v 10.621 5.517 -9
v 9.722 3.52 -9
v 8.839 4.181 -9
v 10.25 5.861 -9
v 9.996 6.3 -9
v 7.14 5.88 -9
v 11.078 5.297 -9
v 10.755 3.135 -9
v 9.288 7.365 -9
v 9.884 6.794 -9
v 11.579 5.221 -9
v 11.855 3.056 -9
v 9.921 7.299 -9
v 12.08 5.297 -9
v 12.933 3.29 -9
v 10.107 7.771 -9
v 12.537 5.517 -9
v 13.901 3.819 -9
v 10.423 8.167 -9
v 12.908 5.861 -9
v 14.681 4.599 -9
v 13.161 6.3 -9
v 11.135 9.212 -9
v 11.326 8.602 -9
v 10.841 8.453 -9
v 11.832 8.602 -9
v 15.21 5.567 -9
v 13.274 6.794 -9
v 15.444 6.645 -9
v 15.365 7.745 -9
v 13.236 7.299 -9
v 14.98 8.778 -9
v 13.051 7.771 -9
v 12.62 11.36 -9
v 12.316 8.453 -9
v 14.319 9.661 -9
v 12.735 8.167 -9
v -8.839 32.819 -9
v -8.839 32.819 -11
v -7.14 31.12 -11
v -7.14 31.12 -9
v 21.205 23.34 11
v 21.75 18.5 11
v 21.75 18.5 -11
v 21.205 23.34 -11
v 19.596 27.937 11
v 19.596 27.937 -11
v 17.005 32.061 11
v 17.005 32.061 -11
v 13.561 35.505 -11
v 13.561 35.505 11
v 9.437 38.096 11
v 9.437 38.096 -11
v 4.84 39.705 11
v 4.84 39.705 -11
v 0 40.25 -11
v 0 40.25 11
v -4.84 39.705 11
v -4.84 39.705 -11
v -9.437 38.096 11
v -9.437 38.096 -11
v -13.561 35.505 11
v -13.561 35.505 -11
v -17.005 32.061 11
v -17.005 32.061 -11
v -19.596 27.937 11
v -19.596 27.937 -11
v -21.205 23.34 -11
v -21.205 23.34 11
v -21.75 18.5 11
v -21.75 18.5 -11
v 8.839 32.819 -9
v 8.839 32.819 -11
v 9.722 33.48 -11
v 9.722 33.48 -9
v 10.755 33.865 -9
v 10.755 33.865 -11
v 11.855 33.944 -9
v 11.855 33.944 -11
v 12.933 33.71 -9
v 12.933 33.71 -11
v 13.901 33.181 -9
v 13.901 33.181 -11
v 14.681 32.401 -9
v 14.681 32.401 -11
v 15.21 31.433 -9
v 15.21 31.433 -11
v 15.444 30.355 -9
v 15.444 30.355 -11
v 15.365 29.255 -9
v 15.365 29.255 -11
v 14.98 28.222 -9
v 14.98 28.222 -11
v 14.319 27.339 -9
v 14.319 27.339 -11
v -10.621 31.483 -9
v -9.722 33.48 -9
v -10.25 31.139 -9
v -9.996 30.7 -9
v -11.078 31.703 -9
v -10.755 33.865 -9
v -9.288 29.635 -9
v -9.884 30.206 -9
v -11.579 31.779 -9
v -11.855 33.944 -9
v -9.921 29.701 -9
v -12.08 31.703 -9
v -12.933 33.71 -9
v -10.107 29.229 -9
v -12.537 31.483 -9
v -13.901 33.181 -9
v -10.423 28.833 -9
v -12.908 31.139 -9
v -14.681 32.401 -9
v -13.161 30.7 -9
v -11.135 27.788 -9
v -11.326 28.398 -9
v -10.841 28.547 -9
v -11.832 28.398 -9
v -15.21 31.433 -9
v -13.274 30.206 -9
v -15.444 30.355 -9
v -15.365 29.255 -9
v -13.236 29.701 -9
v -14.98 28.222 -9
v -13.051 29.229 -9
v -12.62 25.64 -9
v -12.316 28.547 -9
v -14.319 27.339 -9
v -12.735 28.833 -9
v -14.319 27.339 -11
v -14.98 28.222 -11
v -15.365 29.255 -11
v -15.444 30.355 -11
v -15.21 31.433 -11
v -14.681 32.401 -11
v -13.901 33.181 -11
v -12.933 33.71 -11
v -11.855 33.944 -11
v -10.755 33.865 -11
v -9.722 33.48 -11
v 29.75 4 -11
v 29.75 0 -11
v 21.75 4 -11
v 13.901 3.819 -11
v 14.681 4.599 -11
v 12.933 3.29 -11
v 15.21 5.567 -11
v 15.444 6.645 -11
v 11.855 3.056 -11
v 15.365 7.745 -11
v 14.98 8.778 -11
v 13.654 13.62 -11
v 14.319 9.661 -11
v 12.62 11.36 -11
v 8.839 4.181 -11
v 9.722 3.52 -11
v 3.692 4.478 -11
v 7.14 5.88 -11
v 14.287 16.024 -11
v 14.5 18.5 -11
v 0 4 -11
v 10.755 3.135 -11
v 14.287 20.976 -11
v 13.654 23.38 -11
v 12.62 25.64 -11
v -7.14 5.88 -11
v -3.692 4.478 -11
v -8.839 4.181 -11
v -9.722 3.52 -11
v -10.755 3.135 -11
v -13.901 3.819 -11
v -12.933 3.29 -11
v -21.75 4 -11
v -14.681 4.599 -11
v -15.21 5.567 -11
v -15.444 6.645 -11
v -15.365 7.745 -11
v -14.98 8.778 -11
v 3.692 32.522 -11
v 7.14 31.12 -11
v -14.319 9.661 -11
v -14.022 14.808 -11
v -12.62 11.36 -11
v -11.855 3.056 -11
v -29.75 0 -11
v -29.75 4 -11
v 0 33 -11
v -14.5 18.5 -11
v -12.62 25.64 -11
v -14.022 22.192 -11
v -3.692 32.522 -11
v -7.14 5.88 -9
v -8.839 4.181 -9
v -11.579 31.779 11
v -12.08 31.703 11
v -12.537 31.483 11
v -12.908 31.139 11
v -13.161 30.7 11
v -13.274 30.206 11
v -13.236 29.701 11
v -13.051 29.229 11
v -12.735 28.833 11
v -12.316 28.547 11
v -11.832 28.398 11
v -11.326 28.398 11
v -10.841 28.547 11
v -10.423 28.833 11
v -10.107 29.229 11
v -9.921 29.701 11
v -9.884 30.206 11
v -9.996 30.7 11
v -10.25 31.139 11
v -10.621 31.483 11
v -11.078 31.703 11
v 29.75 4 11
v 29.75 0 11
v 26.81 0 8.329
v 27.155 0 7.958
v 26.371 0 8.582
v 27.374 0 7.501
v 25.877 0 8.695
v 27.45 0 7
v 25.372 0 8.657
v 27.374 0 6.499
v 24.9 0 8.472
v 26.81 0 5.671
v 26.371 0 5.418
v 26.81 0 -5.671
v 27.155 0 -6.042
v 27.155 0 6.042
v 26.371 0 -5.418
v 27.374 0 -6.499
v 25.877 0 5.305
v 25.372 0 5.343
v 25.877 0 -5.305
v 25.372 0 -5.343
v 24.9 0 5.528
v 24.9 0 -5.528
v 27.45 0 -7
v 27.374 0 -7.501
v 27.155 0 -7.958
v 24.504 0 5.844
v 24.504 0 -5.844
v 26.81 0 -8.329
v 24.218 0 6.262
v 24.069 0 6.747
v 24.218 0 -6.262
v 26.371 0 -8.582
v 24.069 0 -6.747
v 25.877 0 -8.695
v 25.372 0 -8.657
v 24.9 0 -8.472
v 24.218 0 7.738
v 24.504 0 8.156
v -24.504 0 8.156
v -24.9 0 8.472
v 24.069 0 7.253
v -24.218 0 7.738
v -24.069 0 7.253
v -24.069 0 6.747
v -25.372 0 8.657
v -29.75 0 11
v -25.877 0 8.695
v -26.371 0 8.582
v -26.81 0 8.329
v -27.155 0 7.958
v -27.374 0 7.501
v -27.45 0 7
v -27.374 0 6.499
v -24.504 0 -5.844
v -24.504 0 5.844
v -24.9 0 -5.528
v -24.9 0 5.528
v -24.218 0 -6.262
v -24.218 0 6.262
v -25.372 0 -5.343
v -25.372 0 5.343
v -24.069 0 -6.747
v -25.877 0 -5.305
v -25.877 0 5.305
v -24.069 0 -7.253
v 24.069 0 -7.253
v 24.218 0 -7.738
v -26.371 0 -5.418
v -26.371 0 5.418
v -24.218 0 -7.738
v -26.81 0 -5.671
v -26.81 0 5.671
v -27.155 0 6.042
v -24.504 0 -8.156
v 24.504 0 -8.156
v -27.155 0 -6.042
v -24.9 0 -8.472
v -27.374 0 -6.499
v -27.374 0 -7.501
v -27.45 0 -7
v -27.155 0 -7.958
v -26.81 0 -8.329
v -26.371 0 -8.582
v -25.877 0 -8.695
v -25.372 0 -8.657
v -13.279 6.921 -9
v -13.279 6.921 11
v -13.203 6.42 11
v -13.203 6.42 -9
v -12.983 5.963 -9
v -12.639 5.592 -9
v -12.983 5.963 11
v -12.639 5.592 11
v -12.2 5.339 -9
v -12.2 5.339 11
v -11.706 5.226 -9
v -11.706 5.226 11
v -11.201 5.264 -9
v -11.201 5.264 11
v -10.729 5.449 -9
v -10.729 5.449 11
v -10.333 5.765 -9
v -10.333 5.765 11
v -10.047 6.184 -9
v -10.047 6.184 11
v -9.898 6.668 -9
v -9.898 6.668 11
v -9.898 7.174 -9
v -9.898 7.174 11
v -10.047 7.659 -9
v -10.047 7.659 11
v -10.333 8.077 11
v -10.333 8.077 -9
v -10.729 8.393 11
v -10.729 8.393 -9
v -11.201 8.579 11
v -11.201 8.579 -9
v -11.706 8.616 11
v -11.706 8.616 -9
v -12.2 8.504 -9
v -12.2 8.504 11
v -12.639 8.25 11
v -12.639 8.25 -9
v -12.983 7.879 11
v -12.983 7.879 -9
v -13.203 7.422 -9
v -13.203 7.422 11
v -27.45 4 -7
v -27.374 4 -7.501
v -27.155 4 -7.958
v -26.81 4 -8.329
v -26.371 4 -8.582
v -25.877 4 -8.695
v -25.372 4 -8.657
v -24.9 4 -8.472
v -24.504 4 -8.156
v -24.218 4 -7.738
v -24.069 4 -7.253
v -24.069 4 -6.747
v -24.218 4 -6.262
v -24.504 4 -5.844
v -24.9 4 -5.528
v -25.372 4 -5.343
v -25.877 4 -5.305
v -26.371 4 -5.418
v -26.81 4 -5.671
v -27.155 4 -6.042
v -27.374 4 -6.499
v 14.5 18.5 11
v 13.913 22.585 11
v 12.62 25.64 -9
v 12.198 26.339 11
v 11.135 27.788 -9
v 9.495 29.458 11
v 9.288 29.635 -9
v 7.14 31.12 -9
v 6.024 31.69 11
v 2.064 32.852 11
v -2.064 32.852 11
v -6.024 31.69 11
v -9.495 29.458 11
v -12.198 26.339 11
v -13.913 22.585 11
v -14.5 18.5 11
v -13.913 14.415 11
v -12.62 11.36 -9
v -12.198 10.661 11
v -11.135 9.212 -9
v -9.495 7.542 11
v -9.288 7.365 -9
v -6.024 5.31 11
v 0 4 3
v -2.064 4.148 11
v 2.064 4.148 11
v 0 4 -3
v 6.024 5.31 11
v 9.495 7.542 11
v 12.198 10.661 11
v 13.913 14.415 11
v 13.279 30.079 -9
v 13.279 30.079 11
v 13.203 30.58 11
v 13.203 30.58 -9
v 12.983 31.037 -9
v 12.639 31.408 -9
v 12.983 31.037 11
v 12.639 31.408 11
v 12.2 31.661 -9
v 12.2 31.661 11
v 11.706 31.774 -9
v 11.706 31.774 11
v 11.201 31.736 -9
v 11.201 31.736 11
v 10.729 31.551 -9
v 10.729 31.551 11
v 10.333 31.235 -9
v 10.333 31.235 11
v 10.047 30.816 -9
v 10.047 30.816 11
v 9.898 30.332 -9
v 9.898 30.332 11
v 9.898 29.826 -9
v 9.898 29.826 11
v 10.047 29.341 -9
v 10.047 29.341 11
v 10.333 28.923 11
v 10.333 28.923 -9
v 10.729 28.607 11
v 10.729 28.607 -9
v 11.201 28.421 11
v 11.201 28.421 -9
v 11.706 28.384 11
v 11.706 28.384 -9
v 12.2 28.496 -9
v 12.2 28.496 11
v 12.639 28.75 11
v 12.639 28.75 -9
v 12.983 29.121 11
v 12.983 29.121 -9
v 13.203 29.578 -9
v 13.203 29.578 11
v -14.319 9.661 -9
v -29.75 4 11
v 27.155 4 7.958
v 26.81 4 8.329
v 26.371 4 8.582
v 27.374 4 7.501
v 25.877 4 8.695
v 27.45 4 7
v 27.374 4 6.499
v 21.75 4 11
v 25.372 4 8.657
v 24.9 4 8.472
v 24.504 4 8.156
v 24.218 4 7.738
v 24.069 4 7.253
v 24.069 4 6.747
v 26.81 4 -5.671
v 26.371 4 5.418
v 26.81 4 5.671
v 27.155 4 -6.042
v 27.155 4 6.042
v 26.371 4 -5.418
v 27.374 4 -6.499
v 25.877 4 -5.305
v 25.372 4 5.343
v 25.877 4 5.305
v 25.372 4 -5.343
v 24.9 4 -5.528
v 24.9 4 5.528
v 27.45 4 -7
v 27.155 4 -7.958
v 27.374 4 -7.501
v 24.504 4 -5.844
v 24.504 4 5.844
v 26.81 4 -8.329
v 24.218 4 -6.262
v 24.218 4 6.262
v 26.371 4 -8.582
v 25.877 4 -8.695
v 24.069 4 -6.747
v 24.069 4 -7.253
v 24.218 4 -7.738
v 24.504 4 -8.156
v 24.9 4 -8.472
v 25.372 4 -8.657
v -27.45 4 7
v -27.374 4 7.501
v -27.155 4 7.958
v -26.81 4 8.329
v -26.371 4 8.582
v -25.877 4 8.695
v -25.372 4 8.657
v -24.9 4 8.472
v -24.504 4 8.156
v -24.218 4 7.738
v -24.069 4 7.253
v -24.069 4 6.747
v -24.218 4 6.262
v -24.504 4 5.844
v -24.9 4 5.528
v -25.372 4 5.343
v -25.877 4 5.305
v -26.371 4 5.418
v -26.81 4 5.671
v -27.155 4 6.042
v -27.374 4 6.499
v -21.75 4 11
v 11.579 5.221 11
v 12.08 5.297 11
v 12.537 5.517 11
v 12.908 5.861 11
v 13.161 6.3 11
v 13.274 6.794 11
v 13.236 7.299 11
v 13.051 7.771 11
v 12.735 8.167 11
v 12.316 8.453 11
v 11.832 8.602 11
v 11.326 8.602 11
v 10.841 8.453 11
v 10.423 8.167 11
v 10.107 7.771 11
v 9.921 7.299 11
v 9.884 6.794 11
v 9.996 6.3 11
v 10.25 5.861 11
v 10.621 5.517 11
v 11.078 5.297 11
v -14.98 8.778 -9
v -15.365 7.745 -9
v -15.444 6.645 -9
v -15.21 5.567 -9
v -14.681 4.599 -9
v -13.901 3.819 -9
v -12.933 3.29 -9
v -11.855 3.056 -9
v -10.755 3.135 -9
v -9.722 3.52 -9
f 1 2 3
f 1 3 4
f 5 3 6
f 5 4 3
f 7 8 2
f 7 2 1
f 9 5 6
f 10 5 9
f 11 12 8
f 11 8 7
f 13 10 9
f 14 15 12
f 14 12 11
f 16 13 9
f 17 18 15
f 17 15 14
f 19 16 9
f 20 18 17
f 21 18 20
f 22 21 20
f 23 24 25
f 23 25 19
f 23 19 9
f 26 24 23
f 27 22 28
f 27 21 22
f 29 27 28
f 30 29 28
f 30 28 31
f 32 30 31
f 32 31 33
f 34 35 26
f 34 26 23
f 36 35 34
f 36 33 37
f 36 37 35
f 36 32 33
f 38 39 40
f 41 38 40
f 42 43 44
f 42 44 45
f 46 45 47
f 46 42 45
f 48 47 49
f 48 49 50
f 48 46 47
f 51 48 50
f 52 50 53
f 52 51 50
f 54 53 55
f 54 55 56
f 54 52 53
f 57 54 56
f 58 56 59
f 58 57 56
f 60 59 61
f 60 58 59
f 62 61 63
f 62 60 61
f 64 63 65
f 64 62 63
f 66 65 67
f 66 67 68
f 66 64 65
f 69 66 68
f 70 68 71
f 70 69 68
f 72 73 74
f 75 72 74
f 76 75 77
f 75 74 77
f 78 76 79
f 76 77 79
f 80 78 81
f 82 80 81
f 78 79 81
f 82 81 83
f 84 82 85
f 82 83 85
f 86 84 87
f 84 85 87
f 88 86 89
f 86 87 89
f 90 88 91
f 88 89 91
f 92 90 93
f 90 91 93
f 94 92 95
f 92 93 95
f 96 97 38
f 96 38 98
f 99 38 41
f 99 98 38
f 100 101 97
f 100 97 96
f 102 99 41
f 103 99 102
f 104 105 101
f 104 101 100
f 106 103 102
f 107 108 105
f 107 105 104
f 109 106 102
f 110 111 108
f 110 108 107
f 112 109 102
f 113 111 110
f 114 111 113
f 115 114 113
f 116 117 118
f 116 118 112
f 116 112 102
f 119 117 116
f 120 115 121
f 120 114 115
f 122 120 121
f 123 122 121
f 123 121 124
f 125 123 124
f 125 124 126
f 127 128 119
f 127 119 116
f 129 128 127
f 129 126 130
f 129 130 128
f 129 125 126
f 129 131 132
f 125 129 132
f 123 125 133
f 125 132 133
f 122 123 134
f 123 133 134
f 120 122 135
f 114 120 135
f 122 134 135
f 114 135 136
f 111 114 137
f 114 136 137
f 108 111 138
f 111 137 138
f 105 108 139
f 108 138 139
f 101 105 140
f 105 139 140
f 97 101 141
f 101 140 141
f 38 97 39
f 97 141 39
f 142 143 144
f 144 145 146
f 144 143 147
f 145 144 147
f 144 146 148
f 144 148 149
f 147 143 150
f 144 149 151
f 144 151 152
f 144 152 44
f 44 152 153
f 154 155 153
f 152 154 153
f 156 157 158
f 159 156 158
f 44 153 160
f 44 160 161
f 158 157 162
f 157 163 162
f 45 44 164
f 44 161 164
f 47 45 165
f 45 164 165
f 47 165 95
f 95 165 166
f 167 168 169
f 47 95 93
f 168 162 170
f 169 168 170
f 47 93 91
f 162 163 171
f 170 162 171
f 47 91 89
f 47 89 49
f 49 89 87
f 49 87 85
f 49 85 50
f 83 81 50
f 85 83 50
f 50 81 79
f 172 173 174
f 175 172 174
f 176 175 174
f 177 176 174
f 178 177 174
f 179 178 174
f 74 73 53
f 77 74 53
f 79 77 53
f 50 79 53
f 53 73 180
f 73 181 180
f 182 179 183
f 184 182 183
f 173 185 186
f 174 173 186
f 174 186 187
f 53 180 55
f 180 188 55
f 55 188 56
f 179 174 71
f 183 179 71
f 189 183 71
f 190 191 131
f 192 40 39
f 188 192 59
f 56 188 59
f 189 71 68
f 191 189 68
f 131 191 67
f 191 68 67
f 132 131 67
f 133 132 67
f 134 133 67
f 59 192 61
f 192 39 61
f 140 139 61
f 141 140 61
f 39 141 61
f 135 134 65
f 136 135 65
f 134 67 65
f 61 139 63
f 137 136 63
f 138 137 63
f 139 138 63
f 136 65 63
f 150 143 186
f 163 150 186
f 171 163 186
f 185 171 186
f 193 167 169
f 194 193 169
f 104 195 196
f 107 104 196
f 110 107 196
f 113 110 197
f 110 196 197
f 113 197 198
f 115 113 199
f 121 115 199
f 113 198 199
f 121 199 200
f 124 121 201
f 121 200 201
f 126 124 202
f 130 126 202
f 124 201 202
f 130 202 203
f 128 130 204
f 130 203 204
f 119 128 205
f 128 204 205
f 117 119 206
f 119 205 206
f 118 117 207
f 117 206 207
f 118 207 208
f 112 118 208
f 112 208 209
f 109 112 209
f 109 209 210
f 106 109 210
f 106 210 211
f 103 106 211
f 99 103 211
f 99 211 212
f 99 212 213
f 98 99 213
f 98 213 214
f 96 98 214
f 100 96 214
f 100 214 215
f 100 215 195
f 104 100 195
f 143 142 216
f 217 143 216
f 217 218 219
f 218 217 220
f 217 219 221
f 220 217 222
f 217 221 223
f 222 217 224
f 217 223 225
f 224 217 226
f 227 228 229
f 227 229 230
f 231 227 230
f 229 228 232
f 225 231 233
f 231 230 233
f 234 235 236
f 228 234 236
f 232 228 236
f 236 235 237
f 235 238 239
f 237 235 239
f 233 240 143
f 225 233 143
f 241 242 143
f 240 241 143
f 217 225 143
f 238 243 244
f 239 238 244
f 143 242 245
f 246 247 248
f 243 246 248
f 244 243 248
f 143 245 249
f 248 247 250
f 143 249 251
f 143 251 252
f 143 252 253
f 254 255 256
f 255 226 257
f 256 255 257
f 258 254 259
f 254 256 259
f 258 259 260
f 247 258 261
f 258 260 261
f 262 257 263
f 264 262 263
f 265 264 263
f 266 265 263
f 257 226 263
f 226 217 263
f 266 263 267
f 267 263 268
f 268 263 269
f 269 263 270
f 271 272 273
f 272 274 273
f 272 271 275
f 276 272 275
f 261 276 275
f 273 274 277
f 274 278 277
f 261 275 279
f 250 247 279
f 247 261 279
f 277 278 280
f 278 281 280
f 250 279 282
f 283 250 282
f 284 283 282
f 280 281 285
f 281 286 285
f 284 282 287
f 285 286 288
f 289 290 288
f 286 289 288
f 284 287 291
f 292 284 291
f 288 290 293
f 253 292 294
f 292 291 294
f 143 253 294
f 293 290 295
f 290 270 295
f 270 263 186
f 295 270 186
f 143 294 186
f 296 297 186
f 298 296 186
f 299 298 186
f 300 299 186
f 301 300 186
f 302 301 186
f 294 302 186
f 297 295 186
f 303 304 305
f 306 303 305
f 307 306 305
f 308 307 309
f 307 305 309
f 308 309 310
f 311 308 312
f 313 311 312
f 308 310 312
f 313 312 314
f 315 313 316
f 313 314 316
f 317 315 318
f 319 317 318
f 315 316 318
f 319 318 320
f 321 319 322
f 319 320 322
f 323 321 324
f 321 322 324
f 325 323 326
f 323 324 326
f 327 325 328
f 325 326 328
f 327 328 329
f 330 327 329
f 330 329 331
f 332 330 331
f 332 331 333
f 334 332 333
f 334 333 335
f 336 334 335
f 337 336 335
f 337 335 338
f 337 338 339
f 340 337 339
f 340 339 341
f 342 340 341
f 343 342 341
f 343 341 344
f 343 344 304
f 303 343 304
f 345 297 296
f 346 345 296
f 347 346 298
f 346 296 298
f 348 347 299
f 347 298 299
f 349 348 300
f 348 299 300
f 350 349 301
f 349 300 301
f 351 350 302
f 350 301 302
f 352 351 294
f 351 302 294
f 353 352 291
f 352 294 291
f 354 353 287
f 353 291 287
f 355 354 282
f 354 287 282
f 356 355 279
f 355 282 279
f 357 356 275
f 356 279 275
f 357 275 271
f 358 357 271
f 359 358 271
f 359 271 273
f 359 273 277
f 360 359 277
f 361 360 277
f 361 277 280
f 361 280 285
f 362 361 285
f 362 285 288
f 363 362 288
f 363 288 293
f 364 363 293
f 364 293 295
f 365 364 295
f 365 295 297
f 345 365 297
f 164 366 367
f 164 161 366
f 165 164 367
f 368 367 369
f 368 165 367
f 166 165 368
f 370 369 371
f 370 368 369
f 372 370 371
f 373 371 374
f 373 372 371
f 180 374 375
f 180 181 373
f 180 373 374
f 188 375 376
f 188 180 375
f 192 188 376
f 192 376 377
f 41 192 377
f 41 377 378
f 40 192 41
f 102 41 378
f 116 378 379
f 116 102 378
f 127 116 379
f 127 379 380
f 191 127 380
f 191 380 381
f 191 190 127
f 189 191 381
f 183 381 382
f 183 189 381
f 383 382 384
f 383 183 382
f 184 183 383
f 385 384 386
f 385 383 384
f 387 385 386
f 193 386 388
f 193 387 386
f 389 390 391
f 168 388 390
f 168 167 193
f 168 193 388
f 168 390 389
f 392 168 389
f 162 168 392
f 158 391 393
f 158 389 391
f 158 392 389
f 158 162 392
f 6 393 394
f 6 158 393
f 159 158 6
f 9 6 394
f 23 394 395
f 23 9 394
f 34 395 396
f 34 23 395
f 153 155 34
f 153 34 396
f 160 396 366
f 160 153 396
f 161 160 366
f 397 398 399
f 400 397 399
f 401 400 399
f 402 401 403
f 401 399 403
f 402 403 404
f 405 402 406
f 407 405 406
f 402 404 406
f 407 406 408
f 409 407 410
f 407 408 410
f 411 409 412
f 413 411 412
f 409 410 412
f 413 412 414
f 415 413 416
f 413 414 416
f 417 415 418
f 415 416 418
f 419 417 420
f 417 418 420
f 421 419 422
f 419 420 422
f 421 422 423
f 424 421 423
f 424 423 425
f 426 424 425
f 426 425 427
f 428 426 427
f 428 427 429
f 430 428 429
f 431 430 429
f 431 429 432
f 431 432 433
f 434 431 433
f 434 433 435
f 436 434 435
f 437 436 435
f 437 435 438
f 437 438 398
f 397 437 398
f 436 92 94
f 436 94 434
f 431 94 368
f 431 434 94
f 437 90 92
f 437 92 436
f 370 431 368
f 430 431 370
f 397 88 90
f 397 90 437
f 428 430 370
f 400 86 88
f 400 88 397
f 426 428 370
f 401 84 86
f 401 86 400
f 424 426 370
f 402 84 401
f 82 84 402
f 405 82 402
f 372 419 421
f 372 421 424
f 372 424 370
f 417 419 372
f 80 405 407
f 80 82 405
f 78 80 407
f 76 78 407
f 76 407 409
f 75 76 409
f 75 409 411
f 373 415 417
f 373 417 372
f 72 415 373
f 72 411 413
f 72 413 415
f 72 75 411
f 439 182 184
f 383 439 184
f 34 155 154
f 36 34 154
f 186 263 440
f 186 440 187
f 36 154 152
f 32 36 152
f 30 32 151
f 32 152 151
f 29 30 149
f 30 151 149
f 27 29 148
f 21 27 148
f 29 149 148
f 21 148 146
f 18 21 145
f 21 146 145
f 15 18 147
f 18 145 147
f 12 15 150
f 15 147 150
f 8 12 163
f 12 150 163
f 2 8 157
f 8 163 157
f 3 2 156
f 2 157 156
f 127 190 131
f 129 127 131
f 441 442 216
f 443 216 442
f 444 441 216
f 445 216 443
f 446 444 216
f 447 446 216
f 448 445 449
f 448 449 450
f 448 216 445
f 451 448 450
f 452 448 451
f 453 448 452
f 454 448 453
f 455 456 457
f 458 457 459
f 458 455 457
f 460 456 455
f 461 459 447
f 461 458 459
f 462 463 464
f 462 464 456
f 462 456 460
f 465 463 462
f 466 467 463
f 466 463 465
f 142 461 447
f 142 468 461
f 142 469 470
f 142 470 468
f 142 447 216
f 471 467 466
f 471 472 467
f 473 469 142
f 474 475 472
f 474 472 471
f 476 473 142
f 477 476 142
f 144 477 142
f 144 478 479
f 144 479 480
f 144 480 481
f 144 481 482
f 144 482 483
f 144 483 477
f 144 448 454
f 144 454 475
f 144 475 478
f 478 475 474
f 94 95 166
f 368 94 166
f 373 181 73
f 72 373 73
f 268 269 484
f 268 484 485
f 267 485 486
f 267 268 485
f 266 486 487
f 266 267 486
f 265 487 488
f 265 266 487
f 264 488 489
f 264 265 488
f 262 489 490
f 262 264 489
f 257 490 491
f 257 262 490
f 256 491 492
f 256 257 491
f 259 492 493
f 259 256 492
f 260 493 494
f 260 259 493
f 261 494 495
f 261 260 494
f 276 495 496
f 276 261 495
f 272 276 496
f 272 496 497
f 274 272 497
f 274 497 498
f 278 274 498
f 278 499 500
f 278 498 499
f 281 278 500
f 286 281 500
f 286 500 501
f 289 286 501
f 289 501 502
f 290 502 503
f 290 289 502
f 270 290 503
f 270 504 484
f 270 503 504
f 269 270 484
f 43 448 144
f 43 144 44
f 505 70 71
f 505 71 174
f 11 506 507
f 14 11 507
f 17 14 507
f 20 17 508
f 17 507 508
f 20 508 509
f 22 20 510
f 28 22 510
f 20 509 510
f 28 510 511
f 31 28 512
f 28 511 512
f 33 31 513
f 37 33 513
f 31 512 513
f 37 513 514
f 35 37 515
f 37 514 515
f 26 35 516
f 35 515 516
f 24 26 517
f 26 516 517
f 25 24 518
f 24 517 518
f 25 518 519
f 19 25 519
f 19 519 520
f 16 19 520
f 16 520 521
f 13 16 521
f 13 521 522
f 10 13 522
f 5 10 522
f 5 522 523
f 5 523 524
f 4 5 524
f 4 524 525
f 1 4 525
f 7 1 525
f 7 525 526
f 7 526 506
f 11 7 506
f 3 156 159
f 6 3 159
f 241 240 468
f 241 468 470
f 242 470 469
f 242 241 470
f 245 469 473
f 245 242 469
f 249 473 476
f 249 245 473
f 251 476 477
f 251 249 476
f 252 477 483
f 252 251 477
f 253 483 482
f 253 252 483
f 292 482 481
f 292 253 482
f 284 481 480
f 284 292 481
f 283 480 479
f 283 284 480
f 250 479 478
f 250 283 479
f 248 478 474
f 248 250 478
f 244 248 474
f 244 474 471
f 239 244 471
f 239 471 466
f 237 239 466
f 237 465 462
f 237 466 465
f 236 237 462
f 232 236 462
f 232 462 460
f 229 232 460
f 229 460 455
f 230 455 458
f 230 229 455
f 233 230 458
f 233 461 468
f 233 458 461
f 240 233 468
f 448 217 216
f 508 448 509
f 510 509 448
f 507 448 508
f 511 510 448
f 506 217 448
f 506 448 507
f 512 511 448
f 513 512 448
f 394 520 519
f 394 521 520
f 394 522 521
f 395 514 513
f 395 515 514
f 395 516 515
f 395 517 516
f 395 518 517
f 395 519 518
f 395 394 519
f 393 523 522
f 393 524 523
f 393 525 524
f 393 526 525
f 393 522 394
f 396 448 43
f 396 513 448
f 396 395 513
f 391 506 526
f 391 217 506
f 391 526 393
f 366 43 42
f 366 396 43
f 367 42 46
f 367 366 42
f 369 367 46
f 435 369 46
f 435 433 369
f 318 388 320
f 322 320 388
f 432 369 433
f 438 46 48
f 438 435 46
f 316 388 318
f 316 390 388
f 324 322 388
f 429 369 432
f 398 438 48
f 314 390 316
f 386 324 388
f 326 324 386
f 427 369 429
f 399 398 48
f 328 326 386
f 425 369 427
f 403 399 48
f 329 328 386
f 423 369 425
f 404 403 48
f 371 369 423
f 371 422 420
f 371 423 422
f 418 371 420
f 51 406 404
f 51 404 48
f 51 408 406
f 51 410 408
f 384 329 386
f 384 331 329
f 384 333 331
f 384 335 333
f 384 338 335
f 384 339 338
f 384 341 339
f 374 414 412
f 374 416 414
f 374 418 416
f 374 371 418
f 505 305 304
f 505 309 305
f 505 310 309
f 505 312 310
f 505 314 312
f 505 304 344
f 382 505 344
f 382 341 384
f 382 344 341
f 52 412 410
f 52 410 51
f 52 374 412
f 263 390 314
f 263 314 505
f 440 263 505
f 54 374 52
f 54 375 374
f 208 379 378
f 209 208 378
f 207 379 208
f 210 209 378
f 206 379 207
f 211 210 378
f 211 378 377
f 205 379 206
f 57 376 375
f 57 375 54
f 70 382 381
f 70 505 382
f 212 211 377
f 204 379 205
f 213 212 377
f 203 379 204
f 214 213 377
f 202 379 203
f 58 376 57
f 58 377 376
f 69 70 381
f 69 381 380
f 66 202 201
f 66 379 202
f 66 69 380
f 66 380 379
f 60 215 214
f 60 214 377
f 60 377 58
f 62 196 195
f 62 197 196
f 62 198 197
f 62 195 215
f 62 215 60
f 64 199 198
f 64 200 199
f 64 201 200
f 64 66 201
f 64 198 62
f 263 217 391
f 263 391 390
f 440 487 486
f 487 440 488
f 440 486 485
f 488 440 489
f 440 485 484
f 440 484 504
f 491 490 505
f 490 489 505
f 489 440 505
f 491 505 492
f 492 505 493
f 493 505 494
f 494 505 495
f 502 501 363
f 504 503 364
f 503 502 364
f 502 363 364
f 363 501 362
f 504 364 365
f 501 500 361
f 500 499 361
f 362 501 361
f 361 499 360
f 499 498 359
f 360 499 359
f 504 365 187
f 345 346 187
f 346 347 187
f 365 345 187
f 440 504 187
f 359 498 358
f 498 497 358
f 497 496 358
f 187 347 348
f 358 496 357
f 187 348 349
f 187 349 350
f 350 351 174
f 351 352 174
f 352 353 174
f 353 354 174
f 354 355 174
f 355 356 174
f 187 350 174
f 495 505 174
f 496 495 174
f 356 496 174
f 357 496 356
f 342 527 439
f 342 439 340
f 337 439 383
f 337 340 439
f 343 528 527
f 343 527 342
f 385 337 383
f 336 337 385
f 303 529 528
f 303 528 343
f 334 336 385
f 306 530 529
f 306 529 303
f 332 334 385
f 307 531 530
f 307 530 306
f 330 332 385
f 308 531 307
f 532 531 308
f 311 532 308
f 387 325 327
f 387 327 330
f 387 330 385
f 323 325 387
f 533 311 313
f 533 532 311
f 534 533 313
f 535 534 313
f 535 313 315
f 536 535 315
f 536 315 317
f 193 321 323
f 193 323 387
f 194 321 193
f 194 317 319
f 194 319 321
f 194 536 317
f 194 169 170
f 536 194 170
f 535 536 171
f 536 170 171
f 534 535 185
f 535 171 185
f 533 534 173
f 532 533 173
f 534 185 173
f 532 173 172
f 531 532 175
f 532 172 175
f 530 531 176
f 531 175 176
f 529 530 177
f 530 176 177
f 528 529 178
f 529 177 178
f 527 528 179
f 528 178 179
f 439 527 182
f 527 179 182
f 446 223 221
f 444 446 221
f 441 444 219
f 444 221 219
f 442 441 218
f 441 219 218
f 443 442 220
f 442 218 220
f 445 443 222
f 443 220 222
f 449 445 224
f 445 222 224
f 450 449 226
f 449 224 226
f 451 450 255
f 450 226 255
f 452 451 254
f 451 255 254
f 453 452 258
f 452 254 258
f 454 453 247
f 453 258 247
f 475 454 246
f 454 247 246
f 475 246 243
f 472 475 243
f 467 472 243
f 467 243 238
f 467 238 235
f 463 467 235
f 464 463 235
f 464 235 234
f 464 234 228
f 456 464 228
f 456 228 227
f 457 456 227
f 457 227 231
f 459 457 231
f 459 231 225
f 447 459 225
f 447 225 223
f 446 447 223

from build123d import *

# Parameters (mm, degrees)
SKETCH2_R                       = 14.5
BOSS_EXTRUDE1_DEPTH             = 11
SKETCH4_W                       = 8
SKETCH4_H                       = 4
BOSS_EXTRUDE2_DEPTH             = 8
M3_CLEARANCE_HOLE1_D            = 3.4
MIRROR2_COPY_1_SKETCH_W         = 8
MIRROR2_COPY_1_SKETCH_H         = 4
MIRROR2_COPY_1_DEPTH            = 8
MIRROR2_COPY_2_D                = 3.4
CUT_EXTRUDE1_DEPTH              = 2
M3_CLEARANCE_HOLE2_D            = 3.4
CIRPATTERN1_COUNT               = 4
BOSS_EXTRUDE3_REACH             = 53.246
SKETCH11_W                      = 6
SKETCH11_H                      = 4
BOSS_EXTRUDE3_DIRECTION_2_REACH = 53.246


with BuildPart() as part:
    # Sketch2 → Boss-Extrude1 (new, symmetric)
    with BuildSketch(Plane.XY):
        with BuildLine():
            Line((-21.75, 0), (21.75, 0))
            Line((21.75, 0), (21.75, 18.5))
            ThreePointArc((21.75, 18.5), (0, 40.25), (-21.75, 18.5))
            Line((-21.75, 18.5), (-21.75, 0))
        make_face()
        with Locations((0, 18.5)):
            Circle(SKETCH2_R, mode=Mode.SUBTRACT)
    extrude(amount=BOSS_EXTRUDE1_DEPTH, both=True)

    # Sketch4 → Boss-Extrude2 (add)
    with BuildSketch(Plane.ZY.offset(21.75)):
        with Locations((-7, 2)):
            Rectangle(SKETCH4_W, SKETCH4_H)
    boss_extrude2 = extrude(amount=BOSS_EXTRUDE2_DEPTH)

    # M3 Clearance Hole1 (through all)
    with Locations(Plane(origin=(0, 4, 0), x_dir=(1, 0, 0), z_dir=(0, 1, 0))):
        with Locations((-25.75, 7)):
            m3_clearance_hole1 = Hole(M3_CLEARANCE_HOLE1_D / 2)

    # Mirror1: Boss-Extrude2, M3 Clearance Hole1 across plane
    add(boss_extrude2.mirror(Plane.XY))
    add(m3_clearance_hole1.mirror(Plane.XY), mode=Mode.SUBTRACT)

    # Mirror2: Boss-Extrude2, M3 Clearance Hole1 across plane
    add(boss_extrude2.mirror(Plane(origin=(0, 0, 0), x_dir=(0, 0, 1), z_dir=(1, 0, 0))))
    add(m3_clearance_hole1.mirror(Plane(origin=(0, 0, 0), x_dir=(0, 0, 1), z_dir=(1, 0, 0))), mode=Mode.SUBTRACT)

    # Mirror2 copy 1 sketch → Mirror2 copy 1 (add)
    with BuildSketch(Plane(origin=(21.75, 0, 0), x_dir=(0, 0, -1), z_dir=(1, 0, 0))):
        with Locations((-7, 2)):
            Rectangle(MIRROR2_COPY_1_SKETCH_W, MIRROR2_COPY_1_SKETCH_H)
    extrude(amount=MIRROR2_COPY_1_DEPTH)

    # Mirror2 copy 2 (through all)
    with Locations(Plane(origin=(0, 4, 0), x_dir=(-1, 0, 0), z_dir=(0, 1, 0))):
        with Locations((-25.75, 7)):
            Hole(MIRROR2_COPY_2_D / 2)

    # Sketch8 → Cut-Extrude1 (cut)
    with BuildSketch(Plane(origin=(0, 0, -11), x_dir=(-1, 0, 0), z_dir=(0, 0, -1))):
        with BuildLine():
            Line((-14.318912319, 27.338834765), (-12.620179844, 25.64010229))
            ThreePointArc((-12.620179844, 25.64010229), (-10.253048327, 28.753048327), (-7.14010229, 31.120179844))
            Line((-7.14010229, 31.120179844), (-8.838834765, 32.818912319))
            ThreePointArc((-8.838834765, 32.818912319), (-14.318912319, 32.818912319), (-14.318912319, 27.338834765))
        make_face()
    cut_extrude1 = extrude(amount=-CUT_EXTRUDE1_DEPTH, mode=Mode.SUBTRACT)

    # M3 Clearance Hole2 (through all)
    with Locations(Plane(origin=(0, 0, -9), x_dir=(-1, 0, 0), z_dir=(0, 0, -1))):
        with Locations((-11.578873542, 30.078873542)):
            m3_clearance_hole2 = Hole(M3_CLEARANCE_HOLE2_D / 2)

    # CirPattern1: Cut-Extrude1, M3 Clearance Hole2 ×4 about axis
    cirpattern1_axis = Axis((0, 18.5, 0), (0, 0, 1))
    add([cut_extrude1.rotate(cirpattern1_axis, i * 360 / CIRPATTERN1_COUNT) for i in range(1, CIRPATTERN1_COUNT)], mode=Mode.SUBTRACT)
    add([m3_clearance_hole2.rotate(cirpattern1_axis, i * 360 / CIRPATTERN1_COUNT) for i in range(1, CIRPATTERN1_COUNT)], mode=Mode.SUBTRACT)

    # Boss-Extrude3: up to this face of the body (flat: up to its plane)
    boss_extrude3_end = Plane(part.part.faces().sort_by_distance((29.75, 2, 7))[0])
    # Sketch11 → Boss-Extrude3 (add, up to the picked face)
    with BuildSketch(Plane(origin=(0, 0, 0), x_dir=(0, 0, -1), z_dir=(1, 0, 0)), mode=Mode.PRIVATE) as boss_extrude3_sk1:
        with Locations((0, 2)):
            Rectangle(SKETCH11_W, SKETCH11_H)
    boss_extrude3_tool1 = split(extrude(boss_extrude3_sk1.sketch, amount=BOSS_EXTRUDE3_REACH, mode=Mode.PRIVATE), bisect_by=boss_extrude3_end, keep=Keep.BOTH, mode=Mode.PRIVATE)
    add(boss_extrude3_tool1.solids().sort_by(Axis((0, 2, 0), (1, 0, 0)))[0])

    # Boss-Extrude3 direction 2: up to this face of the body (flat: up to its plane)
    boss_extrude3_direction_2_end = Plane(part.part.faces().sort_by_distance((-29.75, 2, 7))[0])
    # Sketch11 → Boss-Extrude3 direction 2 (add, up to the picked face)
    with BuildSketch(Plane(origin=(0, 0, 0), x_dir=(0, 0, -1), z_dir=(1, 0, 0)), mode=Mode.PRIVATE) as boss_extrude3_direction_2_sk1:
        with Locations((0, 2)):
            Rectangle(SKETCH11_W, SKETCH11_H)
    boss_extrude3_direction_2_tool1 = split(extrude(boss_extrude3_direction_2_sk1.sketch, amount=-BOSS_EXTRUDE3_DIRECTION_2_REACH, mode=Mode.PRIVATE), bisect_by=boss_extrude3_direction_2_end, keep=Keep.BOTH, mode=Mode.PRIVATE)
    add(boss_extrude3_direction_2_tool1.solids().sort_by(Axis((0, 2, 0), (-1, 0, 0)))[0])


solid = part.part
